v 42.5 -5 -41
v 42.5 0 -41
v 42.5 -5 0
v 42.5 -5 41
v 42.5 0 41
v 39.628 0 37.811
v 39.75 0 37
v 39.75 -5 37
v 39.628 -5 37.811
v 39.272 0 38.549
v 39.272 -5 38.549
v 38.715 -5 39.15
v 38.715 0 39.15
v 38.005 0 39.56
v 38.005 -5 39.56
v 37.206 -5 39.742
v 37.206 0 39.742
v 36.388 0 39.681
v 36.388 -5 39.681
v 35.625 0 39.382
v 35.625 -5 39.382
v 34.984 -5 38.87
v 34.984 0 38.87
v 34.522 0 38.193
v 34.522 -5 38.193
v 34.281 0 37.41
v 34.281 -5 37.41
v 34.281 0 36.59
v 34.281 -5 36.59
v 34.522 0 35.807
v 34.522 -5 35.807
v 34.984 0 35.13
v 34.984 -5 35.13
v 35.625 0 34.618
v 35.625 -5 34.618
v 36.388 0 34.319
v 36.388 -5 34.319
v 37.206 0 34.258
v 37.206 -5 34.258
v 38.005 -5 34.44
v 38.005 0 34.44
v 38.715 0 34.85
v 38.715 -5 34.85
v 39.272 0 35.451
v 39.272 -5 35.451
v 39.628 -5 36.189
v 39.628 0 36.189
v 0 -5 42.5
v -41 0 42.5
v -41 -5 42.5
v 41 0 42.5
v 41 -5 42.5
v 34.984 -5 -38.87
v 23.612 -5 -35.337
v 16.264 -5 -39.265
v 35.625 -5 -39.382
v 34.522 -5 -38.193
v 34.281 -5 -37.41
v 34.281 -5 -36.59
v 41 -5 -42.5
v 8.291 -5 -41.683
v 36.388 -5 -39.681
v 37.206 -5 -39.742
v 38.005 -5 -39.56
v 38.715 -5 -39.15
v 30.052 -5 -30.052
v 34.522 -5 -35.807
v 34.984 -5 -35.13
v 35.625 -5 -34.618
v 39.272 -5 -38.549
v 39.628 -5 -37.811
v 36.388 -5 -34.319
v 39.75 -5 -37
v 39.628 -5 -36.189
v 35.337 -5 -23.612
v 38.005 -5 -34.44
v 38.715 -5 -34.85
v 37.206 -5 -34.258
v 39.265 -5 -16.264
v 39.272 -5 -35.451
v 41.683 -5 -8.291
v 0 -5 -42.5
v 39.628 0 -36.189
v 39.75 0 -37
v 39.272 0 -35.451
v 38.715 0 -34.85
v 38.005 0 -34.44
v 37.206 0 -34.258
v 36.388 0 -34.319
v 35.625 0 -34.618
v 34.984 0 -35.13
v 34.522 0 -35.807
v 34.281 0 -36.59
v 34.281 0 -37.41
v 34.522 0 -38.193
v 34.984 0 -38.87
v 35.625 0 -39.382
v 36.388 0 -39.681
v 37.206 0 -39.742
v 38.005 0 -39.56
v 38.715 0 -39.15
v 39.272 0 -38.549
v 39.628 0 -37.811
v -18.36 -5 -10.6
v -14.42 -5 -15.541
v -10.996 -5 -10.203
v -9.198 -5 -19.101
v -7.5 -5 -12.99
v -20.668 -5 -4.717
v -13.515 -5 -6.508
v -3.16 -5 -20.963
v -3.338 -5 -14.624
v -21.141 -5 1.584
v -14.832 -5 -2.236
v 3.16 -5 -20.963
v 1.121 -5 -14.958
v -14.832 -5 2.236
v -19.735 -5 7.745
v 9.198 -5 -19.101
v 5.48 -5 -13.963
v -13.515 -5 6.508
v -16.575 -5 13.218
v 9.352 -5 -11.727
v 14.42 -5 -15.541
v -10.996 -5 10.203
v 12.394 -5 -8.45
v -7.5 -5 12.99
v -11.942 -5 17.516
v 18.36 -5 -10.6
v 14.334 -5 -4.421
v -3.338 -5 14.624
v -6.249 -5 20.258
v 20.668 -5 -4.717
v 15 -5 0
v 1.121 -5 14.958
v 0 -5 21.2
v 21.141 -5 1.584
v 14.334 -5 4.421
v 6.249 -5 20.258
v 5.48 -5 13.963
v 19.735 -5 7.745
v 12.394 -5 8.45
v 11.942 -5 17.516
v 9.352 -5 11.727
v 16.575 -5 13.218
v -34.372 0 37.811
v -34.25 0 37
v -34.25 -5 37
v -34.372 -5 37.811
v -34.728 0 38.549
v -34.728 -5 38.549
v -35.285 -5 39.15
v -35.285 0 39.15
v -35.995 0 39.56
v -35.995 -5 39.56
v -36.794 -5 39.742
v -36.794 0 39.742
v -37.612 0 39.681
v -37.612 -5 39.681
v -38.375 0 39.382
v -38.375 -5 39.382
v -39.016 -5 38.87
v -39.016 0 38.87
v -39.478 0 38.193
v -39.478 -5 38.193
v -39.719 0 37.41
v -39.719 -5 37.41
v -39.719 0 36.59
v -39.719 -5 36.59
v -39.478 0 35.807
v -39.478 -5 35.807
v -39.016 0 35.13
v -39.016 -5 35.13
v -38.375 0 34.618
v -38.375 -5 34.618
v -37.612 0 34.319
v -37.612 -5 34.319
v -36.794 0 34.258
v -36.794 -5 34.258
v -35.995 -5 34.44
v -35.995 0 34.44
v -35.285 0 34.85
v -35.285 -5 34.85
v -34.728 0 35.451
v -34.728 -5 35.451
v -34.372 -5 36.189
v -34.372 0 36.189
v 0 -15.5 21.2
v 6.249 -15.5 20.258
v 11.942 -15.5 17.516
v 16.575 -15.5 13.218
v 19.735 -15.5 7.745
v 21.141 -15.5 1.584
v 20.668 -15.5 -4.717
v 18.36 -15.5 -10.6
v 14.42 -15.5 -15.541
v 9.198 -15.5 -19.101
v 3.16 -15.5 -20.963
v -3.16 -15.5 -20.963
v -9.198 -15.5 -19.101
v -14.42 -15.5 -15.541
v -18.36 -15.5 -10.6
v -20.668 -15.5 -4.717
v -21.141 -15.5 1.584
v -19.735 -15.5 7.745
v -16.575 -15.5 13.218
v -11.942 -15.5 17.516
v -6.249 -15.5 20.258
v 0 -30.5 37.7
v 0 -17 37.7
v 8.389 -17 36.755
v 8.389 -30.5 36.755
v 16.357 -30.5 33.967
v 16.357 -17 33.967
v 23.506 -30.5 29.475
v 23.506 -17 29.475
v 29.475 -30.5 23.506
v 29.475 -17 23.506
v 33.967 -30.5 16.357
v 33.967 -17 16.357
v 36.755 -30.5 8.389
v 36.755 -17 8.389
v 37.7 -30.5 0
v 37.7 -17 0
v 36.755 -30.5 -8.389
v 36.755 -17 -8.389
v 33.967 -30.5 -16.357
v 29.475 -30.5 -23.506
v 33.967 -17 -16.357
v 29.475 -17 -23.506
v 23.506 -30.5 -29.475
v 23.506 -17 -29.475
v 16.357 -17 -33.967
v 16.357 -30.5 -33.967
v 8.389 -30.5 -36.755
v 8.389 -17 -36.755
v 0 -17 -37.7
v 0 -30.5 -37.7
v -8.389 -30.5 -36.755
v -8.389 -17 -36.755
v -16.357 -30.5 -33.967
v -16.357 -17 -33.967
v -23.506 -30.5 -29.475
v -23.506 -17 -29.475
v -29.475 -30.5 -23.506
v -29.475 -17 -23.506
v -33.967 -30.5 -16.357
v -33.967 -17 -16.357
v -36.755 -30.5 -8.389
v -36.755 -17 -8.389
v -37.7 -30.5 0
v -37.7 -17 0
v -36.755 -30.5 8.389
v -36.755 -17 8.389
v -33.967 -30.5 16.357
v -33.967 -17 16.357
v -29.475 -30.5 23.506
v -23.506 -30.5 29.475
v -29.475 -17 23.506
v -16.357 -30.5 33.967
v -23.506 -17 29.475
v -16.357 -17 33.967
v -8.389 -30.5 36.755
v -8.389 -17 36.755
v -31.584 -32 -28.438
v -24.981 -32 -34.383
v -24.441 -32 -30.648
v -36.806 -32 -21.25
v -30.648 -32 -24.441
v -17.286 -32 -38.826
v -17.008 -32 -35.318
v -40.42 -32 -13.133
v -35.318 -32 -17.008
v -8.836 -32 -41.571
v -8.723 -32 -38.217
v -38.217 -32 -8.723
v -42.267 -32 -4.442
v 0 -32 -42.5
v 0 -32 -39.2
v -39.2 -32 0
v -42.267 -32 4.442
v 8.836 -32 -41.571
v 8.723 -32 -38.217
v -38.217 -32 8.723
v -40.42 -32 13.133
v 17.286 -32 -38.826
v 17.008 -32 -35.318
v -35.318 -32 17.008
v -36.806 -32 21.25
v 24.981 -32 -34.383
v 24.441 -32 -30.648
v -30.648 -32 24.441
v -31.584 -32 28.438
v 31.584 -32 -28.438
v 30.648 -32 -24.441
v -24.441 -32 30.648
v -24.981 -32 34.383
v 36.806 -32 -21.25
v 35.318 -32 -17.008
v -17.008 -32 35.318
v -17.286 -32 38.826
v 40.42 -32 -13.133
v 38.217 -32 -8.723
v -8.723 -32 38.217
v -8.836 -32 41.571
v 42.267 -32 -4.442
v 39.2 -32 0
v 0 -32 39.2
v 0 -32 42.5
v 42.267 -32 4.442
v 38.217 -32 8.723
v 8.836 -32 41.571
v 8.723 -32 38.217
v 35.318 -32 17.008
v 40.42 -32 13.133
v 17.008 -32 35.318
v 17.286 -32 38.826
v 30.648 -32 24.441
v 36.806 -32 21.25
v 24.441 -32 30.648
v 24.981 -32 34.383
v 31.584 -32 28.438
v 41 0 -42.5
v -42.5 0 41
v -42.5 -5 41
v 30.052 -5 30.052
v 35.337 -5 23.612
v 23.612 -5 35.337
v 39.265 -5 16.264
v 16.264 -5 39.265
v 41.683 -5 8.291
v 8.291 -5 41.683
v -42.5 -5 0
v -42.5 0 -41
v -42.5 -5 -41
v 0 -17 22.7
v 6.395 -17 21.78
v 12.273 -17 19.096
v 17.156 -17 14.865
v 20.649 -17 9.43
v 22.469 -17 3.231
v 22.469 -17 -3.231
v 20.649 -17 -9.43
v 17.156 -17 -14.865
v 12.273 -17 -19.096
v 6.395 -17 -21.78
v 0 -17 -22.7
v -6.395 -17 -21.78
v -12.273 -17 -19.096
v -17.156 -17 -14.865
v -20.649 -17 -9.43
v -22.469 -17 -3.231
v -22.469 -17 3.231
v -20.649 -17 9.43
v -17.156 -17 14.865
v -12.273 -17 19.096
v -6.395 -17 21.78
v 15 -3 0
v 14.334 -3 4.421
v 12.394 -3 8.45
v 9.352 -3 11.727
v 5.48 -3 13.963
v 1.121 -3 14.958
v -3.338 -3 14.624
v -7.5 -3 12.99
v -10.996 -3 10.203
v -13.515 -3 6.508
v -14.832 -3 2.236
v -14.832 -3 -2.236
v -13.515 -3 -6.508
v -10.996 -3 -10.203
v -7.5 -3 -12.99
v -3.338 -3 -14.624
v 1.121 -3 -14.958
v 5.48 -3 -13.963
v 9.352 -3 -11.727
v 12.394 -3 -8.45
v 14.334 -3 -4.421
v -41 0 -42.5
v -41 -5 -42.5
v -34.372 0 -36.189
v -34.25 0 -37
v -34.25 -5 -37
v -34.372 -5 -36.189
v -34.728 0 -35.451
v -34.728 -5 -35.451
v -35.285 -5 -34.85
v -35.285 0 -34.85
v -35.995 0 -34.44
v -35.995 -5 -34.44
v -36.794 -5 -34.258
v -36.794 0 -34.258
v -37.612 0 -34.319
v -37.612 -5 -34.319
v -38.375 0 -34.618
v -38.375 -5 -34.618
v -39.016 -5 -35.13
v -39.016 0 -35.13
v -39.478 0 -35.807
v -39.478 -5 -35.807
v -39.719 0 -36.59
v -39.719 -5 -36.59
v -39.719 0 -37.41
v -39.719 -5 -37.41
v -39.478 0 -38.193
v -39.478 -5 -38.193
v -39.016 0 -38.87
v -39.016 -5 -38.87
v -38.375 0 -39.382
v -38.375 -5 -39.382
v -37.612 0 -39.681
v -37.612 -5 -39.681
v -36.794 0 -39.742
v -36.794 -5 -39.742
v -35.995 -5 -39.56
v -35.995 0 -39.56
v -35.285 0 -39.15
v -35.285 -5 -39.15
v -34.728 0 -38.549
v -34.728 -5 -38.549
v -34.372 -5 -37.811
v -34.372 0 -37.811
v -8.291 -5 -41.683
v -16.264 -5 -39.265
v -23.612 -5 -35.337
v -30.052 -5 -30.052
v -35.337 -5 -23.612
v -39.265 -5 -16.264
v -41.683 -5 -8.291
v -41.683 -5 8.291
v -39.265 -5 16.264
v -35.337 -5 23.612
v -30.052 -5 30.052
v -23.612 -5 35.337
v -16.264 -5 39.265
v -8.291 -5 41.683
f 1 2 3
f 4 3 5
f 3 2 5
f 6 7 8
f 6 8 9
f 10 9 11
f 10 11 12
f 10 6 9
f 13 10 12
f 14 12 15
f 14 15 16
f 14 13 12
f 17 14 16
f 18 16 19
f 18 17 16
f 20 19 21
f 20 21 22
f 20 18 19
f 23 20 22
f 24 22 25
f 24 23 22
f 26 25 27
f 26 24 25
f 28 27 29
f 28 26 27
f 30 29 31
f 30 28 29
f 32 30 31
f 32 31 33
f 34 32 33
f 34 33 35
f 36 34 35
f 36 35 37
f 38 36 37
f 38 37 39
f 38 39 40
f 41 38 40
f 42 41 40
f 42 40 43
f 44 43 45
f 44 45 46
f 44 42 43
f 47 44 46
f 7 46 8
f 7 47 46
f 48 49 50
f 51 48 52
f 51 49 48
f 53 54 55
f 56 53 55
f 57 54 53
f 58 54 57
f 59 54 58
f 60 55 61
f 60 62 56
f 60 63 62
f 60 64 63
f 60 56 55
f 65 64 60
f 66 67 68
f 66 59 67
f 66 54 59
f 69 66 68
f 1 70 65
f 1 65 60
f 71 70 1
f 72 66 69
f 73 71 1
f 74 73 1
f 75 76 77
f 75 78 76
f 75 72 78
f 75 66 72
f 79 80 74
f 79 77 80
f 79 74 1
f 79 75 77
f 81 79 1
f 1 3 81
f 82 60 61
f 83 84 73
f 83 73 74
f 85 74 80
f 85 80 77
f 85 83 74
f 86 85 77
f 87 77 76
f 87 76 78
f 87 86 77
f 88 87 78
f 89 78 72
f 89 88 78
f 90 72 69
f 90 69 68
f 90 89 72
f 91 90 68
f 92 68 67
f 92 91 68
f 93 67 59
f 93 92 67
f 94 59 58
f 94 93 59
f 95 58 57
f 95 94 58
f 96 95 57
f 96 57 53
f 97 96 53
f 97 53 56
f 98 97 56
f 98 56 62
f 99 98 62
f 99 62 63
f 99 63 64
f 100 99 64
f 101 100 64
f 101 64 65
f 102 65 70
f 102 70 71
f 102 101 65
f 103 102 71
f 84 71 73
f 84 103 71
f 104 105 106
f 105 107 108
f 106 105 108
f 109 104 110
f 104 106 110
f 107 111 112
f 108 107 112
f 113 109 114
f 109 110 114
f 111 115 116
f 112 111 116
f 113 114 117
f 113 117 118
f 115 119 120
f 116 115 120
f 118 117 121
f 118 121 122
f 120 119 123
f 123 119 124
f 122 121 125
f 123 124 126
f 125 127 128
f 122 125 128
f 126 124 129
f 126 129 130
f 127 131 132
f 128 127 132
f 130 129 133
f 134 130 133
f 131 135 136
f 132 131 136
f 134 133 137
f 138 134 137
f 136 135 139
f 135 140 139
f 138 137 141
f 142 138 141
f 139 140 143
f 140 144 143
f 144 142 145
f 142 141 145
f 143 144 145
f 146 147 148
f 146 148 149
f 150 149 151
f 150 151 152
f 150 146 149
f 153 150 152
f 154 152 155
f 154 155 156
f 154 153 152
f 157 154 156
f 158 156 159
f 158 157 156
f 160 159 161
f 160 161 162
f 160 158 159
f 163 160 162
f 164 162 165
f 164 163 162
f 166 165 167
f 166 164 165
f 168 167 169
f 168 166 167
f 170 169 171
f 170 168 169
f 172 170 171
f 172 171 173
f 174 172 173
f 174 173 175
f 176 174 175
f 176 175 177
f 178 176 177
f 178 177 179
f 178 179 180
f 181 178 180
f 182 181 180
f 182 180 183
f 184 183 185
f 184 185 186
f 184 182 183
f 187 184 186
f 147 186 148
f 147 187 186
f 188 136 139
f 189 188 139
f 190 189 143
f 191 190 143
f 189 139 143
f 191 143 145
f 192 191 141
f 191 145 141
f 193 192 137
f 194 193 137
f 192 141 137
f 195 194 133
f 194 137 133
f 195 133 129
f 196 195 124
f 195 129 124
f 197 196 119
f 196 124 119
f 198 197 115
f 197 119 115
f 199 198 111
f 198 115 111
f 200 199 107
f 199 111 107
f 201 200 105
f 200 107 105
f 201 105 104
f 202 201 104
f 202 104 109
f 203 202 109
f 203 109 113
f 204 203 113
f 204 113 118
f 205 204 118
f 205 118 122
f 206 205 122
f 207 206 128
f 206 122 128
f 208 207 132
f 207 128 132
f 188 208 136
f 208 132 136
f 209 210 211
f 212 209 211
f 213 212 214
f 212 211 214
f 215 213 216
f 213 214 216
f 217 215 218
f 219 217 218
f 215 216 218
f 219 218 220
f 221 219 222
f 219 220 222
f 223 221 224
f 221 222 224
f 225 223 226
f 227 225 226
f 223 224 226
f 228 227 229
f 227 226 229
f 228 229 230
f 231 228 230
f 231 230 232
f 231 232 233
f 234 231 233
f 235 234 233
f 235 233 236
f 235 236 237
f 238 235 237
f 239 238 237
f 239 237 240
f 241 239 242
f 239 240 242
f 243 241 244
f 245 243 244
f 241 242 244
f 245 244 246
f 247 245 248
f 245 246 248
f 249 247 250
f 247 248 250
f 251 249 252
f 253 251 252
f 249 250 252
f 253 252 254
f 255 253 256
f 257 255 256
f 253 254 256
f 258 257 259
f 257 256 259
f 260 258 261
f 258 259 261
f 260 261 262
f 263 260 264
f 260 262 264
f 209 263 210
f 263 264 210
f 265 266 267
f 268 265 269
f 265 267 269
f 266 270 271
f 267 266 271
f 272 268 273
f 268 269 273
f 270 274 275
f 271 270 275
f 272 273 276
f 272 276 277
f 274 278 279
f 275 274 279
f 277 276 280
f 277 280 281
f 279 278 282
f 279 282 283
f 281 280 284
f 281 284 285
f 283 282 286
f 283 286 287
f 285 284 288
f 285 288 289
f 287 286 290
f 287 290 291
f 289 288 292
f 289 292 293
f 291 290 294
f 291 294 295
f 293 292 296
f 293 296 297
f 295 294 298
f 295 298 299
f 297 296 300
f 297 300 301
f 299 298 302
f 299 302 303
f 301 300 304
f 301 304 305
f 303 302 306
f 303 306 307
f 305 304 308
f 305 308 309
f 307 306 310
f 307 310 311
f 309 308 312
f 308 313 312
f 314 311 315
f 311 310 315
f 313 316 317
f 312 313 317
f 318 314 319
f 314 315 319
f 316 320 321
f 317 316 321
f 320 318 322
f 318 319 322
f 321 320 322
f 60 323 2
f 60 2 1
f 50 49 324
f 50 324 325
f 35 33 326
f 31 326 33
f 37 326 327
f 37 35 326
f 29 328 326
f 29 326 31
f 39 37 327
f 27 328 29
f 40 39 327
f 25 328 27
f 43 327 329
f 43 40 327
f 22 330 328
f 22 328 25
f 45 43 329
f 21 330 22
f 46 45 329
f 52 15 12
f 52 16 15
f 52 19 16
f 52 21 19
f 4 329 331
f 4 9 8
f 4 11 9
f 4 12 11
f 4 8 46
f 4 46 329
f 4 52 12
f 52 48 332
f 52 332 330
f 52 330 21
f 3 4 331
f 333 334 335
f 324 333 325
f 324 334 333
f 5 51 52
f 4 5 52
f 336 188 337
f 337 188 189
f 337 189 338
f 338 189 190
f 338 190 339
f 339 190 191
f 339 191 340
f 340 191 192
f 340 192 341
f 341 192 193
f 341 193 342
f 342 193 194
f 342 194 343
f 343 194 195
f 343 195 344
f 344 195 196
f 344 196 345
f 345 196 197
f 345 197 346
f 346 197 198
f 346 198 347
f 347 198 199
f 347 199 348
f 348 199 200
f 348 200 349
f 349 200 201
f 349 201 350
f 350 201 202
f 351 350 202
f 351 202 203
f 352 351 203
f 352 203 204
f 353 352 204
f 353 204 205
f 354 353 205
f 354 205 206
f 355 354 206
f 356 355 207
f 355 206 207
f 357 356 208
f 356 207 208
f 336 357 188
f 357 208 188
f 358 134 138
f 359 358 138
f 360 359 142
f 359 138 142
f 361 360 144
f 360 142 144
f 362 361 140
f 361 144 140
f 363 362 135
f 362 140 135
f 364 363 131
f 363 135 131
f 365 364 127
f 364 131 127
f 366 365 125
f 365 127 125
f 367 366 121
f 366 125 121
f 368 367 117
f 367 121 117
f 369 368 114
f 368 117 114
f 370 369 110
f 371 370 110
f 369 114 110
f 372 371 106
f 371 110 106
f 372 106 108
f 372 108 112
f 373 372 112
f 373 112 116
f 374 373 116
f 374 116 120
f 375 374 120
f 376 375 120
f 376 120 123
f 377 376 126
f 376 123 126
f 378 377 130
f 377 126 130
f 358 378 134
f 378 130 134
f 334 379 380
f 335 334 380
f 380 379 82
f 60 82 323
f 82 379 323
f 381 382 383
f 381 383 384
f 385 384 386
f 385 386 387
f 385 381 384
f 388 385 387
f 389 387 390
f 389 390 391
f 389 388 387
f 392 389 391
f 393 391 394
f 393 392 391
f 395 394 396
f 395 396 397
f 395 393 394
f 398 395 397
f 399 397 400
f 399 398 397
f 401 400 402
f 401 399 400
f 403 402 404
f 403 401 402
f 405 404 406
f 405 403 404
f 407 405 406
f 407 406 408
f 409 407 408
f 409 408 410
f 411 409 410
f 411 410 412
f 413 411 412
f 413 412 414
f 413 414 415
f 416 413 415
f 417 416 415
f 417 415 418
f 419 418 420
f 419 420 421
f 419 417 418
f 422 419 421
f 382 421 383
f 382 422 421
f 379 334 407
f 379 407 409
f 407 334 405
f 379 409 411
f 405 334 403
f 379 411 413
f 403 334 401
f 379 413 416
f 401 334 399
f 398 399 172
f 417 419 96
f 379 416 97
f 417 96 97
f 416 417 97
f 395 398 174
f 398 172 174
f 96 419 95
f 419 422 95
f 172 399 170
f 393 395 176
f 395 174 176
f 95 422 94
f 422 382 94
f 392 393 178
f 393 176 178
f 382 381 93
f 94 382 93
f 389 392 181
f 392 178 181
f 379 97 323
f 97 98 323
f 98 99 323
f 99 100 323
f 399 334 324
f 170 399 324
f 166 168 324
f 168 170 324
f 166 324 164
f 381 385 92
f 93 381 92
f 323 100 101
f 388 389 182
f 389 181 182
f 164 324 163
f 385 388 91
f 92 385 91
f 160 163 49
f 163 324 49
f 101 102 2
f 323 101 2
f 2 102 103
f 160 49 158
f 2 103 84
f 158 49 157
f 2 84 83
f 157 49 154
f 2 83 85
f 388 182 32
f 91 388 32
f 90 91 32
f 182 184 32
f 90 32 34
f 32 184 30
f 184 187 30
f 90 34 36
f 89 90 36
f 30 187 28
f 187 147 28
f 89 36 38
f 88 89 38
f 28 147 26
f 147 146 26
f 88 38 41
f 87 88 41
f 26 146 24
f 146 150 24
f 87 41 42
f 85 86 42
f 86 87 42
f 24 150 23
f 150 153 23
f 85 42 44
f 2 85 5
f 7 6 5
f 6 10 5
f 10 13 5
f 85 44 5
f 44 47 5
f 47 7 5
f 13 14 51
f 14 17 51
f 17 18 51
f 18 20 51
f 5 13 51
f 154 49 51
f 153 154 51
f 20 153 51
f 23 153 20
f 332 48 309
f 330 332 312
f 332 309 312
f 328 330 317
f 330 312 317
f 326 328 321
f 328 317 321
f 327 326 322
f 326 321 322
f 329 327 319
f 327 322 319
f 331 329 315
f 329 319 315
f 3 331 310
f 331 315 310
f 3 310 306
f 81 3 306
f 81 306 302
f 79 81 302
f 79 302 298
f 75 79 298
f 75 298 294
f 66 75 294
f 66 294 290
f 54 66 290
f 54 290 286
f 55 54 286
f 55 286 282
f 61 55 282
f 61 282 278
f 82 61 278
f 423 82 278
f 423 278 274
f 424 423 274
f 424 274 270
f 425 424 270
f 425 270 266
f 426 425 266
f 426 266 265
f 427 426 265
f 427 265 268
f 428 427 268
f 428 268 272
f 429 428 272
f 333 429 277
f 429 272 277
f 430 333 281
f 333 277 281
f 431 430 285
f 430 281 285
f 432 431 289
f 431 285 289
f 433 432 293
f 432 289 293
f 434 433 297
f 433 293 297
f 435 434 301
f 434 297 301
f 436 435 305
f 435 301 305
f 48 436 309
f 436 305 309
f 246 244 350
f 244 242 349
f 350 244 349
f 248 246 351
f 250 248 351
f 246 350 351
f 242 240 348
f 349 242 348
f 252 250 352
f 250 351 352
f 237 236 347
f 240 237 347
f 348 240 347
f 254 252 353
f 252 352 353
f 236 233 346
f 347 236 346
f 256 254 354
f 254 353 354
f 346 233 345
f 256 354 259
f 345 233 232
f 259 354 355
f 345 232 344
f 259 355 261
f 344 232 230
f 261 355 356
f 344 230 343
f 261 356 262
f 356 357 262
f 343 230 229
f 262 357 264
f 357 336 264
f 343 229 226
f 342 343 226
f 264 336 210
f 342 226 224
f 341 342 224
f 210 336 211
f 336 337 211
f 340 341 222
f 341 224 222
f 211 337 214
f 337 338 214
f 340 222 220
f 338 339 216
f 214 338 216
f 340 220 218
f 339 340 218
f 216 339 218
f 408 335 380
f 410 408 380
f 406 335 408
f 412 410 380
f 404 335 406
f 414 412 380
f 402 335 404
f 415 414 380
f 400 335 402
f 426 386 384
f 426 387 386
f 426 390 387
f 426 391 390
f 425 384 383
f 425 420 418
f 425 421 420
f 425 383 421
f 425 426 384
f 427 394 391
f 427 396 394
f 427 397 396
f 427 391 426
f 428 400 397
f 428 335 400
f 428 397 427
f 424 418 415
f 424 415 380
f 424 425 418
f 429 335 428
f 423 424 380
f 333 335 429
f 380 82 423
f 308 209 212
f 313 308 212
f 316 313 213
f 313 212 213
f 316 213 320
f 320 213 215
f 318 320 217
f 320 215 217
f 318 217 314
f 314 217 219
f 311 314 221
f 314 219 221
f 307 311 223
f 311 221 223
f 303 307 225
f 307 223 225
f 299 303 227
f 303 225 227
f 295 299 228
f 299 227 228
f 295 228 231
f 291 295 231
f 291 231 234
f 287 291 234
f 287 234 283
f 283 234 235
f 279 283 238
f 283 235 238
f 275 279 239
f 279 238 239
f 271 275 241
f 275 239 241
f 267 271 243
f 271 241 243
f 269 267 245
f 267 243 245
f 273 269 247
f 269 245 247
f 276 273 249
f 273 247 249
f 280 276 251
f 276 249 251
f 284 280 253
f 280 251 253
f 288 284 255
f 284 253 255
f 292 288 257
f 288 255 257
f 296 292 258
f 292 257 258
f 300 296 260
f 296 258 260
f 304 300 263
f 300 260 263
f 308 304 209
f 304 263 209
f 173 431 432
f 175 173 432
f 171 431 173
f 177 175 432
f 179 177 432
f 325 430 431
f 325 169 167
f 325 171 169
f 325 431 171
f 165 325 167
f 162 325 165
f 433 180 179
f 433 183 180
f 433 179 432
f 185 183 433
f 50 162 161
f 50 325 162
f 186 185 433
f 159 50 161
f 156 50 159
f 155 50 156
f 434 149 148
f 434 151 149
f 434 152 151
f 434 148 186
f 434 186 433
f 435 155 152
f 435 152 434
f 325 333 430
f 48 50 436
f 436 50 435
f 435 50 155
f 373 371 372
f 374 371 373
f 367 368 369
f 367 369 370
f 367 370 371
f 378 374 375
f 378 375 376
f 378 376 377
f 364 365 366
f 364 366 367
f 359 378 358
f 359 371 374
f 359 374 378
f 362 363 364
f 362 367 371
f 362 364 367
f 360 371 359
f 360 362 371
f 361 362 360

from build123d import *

# Parameters (mm, degrees)
F2_W     = 85
F2_H     = 85
F2_R     = 2.75
F3_DEPTH = 5
F4_SIZE  = 1.5
F5_R     = 15
F6_DEPTH = 2


with BuildPart() as f1:
    # F0 (on Right) → F1 (revolve)
    with BuildSketch(Plane.YZ):
        Polygon((-5, 0), (0, 0), (0, 42.5), (-32, 42.5), (-32, 37.7), (-17, 37.7), (-17, 21.2), (-5, 21.2), align=None)
    revolve(axis=Axis((0, -2.5, 0), (0, 1, 0)))

    # F2 (on Front) → F3 (join)
    with BuildSketch(Plane.XZ):
        Rectangle(F2_W, F2_H)
        with Locations((-37, -37)):
            Circle(F2_R, mode=Mode.SUBTRACT)
        with Locations((37, -37)):
            Circle(F2_R, mode=Mode.SUBTRACT)
        with Locations((-37, 37)):
            Circle(F2_R, mode=Mode.SUBTRACT)
        with Locations((37, 37)):
            Circle(F2_R, mode=Mode.SUBTRACT)
    extrude(amount=F3_DEPTH)

    # F4
    f4_edges = [f1.edges().sort_by_distance(p)[0] for p in [
        (0, -32, -37.7),
        (0, -17, -21.2),
        (42.5, -2.5, 42.5),
        (-42.5, -2.5, 42.5),
        (-42.5, -2.5, -42.5),
        (42.5, -2.5, -42.5),
    ]]
    chamfer(f4_edges, length=F4_SIZE)

    # F5 (on face) → F6 (cut)
    with BuildSketch(Plane.XZ.offset(5)):
        Circle(F5_R)
    extrude(amount=-F6_DEPTH, mode=Mode.SUBTRACT)


solid = f1.part
